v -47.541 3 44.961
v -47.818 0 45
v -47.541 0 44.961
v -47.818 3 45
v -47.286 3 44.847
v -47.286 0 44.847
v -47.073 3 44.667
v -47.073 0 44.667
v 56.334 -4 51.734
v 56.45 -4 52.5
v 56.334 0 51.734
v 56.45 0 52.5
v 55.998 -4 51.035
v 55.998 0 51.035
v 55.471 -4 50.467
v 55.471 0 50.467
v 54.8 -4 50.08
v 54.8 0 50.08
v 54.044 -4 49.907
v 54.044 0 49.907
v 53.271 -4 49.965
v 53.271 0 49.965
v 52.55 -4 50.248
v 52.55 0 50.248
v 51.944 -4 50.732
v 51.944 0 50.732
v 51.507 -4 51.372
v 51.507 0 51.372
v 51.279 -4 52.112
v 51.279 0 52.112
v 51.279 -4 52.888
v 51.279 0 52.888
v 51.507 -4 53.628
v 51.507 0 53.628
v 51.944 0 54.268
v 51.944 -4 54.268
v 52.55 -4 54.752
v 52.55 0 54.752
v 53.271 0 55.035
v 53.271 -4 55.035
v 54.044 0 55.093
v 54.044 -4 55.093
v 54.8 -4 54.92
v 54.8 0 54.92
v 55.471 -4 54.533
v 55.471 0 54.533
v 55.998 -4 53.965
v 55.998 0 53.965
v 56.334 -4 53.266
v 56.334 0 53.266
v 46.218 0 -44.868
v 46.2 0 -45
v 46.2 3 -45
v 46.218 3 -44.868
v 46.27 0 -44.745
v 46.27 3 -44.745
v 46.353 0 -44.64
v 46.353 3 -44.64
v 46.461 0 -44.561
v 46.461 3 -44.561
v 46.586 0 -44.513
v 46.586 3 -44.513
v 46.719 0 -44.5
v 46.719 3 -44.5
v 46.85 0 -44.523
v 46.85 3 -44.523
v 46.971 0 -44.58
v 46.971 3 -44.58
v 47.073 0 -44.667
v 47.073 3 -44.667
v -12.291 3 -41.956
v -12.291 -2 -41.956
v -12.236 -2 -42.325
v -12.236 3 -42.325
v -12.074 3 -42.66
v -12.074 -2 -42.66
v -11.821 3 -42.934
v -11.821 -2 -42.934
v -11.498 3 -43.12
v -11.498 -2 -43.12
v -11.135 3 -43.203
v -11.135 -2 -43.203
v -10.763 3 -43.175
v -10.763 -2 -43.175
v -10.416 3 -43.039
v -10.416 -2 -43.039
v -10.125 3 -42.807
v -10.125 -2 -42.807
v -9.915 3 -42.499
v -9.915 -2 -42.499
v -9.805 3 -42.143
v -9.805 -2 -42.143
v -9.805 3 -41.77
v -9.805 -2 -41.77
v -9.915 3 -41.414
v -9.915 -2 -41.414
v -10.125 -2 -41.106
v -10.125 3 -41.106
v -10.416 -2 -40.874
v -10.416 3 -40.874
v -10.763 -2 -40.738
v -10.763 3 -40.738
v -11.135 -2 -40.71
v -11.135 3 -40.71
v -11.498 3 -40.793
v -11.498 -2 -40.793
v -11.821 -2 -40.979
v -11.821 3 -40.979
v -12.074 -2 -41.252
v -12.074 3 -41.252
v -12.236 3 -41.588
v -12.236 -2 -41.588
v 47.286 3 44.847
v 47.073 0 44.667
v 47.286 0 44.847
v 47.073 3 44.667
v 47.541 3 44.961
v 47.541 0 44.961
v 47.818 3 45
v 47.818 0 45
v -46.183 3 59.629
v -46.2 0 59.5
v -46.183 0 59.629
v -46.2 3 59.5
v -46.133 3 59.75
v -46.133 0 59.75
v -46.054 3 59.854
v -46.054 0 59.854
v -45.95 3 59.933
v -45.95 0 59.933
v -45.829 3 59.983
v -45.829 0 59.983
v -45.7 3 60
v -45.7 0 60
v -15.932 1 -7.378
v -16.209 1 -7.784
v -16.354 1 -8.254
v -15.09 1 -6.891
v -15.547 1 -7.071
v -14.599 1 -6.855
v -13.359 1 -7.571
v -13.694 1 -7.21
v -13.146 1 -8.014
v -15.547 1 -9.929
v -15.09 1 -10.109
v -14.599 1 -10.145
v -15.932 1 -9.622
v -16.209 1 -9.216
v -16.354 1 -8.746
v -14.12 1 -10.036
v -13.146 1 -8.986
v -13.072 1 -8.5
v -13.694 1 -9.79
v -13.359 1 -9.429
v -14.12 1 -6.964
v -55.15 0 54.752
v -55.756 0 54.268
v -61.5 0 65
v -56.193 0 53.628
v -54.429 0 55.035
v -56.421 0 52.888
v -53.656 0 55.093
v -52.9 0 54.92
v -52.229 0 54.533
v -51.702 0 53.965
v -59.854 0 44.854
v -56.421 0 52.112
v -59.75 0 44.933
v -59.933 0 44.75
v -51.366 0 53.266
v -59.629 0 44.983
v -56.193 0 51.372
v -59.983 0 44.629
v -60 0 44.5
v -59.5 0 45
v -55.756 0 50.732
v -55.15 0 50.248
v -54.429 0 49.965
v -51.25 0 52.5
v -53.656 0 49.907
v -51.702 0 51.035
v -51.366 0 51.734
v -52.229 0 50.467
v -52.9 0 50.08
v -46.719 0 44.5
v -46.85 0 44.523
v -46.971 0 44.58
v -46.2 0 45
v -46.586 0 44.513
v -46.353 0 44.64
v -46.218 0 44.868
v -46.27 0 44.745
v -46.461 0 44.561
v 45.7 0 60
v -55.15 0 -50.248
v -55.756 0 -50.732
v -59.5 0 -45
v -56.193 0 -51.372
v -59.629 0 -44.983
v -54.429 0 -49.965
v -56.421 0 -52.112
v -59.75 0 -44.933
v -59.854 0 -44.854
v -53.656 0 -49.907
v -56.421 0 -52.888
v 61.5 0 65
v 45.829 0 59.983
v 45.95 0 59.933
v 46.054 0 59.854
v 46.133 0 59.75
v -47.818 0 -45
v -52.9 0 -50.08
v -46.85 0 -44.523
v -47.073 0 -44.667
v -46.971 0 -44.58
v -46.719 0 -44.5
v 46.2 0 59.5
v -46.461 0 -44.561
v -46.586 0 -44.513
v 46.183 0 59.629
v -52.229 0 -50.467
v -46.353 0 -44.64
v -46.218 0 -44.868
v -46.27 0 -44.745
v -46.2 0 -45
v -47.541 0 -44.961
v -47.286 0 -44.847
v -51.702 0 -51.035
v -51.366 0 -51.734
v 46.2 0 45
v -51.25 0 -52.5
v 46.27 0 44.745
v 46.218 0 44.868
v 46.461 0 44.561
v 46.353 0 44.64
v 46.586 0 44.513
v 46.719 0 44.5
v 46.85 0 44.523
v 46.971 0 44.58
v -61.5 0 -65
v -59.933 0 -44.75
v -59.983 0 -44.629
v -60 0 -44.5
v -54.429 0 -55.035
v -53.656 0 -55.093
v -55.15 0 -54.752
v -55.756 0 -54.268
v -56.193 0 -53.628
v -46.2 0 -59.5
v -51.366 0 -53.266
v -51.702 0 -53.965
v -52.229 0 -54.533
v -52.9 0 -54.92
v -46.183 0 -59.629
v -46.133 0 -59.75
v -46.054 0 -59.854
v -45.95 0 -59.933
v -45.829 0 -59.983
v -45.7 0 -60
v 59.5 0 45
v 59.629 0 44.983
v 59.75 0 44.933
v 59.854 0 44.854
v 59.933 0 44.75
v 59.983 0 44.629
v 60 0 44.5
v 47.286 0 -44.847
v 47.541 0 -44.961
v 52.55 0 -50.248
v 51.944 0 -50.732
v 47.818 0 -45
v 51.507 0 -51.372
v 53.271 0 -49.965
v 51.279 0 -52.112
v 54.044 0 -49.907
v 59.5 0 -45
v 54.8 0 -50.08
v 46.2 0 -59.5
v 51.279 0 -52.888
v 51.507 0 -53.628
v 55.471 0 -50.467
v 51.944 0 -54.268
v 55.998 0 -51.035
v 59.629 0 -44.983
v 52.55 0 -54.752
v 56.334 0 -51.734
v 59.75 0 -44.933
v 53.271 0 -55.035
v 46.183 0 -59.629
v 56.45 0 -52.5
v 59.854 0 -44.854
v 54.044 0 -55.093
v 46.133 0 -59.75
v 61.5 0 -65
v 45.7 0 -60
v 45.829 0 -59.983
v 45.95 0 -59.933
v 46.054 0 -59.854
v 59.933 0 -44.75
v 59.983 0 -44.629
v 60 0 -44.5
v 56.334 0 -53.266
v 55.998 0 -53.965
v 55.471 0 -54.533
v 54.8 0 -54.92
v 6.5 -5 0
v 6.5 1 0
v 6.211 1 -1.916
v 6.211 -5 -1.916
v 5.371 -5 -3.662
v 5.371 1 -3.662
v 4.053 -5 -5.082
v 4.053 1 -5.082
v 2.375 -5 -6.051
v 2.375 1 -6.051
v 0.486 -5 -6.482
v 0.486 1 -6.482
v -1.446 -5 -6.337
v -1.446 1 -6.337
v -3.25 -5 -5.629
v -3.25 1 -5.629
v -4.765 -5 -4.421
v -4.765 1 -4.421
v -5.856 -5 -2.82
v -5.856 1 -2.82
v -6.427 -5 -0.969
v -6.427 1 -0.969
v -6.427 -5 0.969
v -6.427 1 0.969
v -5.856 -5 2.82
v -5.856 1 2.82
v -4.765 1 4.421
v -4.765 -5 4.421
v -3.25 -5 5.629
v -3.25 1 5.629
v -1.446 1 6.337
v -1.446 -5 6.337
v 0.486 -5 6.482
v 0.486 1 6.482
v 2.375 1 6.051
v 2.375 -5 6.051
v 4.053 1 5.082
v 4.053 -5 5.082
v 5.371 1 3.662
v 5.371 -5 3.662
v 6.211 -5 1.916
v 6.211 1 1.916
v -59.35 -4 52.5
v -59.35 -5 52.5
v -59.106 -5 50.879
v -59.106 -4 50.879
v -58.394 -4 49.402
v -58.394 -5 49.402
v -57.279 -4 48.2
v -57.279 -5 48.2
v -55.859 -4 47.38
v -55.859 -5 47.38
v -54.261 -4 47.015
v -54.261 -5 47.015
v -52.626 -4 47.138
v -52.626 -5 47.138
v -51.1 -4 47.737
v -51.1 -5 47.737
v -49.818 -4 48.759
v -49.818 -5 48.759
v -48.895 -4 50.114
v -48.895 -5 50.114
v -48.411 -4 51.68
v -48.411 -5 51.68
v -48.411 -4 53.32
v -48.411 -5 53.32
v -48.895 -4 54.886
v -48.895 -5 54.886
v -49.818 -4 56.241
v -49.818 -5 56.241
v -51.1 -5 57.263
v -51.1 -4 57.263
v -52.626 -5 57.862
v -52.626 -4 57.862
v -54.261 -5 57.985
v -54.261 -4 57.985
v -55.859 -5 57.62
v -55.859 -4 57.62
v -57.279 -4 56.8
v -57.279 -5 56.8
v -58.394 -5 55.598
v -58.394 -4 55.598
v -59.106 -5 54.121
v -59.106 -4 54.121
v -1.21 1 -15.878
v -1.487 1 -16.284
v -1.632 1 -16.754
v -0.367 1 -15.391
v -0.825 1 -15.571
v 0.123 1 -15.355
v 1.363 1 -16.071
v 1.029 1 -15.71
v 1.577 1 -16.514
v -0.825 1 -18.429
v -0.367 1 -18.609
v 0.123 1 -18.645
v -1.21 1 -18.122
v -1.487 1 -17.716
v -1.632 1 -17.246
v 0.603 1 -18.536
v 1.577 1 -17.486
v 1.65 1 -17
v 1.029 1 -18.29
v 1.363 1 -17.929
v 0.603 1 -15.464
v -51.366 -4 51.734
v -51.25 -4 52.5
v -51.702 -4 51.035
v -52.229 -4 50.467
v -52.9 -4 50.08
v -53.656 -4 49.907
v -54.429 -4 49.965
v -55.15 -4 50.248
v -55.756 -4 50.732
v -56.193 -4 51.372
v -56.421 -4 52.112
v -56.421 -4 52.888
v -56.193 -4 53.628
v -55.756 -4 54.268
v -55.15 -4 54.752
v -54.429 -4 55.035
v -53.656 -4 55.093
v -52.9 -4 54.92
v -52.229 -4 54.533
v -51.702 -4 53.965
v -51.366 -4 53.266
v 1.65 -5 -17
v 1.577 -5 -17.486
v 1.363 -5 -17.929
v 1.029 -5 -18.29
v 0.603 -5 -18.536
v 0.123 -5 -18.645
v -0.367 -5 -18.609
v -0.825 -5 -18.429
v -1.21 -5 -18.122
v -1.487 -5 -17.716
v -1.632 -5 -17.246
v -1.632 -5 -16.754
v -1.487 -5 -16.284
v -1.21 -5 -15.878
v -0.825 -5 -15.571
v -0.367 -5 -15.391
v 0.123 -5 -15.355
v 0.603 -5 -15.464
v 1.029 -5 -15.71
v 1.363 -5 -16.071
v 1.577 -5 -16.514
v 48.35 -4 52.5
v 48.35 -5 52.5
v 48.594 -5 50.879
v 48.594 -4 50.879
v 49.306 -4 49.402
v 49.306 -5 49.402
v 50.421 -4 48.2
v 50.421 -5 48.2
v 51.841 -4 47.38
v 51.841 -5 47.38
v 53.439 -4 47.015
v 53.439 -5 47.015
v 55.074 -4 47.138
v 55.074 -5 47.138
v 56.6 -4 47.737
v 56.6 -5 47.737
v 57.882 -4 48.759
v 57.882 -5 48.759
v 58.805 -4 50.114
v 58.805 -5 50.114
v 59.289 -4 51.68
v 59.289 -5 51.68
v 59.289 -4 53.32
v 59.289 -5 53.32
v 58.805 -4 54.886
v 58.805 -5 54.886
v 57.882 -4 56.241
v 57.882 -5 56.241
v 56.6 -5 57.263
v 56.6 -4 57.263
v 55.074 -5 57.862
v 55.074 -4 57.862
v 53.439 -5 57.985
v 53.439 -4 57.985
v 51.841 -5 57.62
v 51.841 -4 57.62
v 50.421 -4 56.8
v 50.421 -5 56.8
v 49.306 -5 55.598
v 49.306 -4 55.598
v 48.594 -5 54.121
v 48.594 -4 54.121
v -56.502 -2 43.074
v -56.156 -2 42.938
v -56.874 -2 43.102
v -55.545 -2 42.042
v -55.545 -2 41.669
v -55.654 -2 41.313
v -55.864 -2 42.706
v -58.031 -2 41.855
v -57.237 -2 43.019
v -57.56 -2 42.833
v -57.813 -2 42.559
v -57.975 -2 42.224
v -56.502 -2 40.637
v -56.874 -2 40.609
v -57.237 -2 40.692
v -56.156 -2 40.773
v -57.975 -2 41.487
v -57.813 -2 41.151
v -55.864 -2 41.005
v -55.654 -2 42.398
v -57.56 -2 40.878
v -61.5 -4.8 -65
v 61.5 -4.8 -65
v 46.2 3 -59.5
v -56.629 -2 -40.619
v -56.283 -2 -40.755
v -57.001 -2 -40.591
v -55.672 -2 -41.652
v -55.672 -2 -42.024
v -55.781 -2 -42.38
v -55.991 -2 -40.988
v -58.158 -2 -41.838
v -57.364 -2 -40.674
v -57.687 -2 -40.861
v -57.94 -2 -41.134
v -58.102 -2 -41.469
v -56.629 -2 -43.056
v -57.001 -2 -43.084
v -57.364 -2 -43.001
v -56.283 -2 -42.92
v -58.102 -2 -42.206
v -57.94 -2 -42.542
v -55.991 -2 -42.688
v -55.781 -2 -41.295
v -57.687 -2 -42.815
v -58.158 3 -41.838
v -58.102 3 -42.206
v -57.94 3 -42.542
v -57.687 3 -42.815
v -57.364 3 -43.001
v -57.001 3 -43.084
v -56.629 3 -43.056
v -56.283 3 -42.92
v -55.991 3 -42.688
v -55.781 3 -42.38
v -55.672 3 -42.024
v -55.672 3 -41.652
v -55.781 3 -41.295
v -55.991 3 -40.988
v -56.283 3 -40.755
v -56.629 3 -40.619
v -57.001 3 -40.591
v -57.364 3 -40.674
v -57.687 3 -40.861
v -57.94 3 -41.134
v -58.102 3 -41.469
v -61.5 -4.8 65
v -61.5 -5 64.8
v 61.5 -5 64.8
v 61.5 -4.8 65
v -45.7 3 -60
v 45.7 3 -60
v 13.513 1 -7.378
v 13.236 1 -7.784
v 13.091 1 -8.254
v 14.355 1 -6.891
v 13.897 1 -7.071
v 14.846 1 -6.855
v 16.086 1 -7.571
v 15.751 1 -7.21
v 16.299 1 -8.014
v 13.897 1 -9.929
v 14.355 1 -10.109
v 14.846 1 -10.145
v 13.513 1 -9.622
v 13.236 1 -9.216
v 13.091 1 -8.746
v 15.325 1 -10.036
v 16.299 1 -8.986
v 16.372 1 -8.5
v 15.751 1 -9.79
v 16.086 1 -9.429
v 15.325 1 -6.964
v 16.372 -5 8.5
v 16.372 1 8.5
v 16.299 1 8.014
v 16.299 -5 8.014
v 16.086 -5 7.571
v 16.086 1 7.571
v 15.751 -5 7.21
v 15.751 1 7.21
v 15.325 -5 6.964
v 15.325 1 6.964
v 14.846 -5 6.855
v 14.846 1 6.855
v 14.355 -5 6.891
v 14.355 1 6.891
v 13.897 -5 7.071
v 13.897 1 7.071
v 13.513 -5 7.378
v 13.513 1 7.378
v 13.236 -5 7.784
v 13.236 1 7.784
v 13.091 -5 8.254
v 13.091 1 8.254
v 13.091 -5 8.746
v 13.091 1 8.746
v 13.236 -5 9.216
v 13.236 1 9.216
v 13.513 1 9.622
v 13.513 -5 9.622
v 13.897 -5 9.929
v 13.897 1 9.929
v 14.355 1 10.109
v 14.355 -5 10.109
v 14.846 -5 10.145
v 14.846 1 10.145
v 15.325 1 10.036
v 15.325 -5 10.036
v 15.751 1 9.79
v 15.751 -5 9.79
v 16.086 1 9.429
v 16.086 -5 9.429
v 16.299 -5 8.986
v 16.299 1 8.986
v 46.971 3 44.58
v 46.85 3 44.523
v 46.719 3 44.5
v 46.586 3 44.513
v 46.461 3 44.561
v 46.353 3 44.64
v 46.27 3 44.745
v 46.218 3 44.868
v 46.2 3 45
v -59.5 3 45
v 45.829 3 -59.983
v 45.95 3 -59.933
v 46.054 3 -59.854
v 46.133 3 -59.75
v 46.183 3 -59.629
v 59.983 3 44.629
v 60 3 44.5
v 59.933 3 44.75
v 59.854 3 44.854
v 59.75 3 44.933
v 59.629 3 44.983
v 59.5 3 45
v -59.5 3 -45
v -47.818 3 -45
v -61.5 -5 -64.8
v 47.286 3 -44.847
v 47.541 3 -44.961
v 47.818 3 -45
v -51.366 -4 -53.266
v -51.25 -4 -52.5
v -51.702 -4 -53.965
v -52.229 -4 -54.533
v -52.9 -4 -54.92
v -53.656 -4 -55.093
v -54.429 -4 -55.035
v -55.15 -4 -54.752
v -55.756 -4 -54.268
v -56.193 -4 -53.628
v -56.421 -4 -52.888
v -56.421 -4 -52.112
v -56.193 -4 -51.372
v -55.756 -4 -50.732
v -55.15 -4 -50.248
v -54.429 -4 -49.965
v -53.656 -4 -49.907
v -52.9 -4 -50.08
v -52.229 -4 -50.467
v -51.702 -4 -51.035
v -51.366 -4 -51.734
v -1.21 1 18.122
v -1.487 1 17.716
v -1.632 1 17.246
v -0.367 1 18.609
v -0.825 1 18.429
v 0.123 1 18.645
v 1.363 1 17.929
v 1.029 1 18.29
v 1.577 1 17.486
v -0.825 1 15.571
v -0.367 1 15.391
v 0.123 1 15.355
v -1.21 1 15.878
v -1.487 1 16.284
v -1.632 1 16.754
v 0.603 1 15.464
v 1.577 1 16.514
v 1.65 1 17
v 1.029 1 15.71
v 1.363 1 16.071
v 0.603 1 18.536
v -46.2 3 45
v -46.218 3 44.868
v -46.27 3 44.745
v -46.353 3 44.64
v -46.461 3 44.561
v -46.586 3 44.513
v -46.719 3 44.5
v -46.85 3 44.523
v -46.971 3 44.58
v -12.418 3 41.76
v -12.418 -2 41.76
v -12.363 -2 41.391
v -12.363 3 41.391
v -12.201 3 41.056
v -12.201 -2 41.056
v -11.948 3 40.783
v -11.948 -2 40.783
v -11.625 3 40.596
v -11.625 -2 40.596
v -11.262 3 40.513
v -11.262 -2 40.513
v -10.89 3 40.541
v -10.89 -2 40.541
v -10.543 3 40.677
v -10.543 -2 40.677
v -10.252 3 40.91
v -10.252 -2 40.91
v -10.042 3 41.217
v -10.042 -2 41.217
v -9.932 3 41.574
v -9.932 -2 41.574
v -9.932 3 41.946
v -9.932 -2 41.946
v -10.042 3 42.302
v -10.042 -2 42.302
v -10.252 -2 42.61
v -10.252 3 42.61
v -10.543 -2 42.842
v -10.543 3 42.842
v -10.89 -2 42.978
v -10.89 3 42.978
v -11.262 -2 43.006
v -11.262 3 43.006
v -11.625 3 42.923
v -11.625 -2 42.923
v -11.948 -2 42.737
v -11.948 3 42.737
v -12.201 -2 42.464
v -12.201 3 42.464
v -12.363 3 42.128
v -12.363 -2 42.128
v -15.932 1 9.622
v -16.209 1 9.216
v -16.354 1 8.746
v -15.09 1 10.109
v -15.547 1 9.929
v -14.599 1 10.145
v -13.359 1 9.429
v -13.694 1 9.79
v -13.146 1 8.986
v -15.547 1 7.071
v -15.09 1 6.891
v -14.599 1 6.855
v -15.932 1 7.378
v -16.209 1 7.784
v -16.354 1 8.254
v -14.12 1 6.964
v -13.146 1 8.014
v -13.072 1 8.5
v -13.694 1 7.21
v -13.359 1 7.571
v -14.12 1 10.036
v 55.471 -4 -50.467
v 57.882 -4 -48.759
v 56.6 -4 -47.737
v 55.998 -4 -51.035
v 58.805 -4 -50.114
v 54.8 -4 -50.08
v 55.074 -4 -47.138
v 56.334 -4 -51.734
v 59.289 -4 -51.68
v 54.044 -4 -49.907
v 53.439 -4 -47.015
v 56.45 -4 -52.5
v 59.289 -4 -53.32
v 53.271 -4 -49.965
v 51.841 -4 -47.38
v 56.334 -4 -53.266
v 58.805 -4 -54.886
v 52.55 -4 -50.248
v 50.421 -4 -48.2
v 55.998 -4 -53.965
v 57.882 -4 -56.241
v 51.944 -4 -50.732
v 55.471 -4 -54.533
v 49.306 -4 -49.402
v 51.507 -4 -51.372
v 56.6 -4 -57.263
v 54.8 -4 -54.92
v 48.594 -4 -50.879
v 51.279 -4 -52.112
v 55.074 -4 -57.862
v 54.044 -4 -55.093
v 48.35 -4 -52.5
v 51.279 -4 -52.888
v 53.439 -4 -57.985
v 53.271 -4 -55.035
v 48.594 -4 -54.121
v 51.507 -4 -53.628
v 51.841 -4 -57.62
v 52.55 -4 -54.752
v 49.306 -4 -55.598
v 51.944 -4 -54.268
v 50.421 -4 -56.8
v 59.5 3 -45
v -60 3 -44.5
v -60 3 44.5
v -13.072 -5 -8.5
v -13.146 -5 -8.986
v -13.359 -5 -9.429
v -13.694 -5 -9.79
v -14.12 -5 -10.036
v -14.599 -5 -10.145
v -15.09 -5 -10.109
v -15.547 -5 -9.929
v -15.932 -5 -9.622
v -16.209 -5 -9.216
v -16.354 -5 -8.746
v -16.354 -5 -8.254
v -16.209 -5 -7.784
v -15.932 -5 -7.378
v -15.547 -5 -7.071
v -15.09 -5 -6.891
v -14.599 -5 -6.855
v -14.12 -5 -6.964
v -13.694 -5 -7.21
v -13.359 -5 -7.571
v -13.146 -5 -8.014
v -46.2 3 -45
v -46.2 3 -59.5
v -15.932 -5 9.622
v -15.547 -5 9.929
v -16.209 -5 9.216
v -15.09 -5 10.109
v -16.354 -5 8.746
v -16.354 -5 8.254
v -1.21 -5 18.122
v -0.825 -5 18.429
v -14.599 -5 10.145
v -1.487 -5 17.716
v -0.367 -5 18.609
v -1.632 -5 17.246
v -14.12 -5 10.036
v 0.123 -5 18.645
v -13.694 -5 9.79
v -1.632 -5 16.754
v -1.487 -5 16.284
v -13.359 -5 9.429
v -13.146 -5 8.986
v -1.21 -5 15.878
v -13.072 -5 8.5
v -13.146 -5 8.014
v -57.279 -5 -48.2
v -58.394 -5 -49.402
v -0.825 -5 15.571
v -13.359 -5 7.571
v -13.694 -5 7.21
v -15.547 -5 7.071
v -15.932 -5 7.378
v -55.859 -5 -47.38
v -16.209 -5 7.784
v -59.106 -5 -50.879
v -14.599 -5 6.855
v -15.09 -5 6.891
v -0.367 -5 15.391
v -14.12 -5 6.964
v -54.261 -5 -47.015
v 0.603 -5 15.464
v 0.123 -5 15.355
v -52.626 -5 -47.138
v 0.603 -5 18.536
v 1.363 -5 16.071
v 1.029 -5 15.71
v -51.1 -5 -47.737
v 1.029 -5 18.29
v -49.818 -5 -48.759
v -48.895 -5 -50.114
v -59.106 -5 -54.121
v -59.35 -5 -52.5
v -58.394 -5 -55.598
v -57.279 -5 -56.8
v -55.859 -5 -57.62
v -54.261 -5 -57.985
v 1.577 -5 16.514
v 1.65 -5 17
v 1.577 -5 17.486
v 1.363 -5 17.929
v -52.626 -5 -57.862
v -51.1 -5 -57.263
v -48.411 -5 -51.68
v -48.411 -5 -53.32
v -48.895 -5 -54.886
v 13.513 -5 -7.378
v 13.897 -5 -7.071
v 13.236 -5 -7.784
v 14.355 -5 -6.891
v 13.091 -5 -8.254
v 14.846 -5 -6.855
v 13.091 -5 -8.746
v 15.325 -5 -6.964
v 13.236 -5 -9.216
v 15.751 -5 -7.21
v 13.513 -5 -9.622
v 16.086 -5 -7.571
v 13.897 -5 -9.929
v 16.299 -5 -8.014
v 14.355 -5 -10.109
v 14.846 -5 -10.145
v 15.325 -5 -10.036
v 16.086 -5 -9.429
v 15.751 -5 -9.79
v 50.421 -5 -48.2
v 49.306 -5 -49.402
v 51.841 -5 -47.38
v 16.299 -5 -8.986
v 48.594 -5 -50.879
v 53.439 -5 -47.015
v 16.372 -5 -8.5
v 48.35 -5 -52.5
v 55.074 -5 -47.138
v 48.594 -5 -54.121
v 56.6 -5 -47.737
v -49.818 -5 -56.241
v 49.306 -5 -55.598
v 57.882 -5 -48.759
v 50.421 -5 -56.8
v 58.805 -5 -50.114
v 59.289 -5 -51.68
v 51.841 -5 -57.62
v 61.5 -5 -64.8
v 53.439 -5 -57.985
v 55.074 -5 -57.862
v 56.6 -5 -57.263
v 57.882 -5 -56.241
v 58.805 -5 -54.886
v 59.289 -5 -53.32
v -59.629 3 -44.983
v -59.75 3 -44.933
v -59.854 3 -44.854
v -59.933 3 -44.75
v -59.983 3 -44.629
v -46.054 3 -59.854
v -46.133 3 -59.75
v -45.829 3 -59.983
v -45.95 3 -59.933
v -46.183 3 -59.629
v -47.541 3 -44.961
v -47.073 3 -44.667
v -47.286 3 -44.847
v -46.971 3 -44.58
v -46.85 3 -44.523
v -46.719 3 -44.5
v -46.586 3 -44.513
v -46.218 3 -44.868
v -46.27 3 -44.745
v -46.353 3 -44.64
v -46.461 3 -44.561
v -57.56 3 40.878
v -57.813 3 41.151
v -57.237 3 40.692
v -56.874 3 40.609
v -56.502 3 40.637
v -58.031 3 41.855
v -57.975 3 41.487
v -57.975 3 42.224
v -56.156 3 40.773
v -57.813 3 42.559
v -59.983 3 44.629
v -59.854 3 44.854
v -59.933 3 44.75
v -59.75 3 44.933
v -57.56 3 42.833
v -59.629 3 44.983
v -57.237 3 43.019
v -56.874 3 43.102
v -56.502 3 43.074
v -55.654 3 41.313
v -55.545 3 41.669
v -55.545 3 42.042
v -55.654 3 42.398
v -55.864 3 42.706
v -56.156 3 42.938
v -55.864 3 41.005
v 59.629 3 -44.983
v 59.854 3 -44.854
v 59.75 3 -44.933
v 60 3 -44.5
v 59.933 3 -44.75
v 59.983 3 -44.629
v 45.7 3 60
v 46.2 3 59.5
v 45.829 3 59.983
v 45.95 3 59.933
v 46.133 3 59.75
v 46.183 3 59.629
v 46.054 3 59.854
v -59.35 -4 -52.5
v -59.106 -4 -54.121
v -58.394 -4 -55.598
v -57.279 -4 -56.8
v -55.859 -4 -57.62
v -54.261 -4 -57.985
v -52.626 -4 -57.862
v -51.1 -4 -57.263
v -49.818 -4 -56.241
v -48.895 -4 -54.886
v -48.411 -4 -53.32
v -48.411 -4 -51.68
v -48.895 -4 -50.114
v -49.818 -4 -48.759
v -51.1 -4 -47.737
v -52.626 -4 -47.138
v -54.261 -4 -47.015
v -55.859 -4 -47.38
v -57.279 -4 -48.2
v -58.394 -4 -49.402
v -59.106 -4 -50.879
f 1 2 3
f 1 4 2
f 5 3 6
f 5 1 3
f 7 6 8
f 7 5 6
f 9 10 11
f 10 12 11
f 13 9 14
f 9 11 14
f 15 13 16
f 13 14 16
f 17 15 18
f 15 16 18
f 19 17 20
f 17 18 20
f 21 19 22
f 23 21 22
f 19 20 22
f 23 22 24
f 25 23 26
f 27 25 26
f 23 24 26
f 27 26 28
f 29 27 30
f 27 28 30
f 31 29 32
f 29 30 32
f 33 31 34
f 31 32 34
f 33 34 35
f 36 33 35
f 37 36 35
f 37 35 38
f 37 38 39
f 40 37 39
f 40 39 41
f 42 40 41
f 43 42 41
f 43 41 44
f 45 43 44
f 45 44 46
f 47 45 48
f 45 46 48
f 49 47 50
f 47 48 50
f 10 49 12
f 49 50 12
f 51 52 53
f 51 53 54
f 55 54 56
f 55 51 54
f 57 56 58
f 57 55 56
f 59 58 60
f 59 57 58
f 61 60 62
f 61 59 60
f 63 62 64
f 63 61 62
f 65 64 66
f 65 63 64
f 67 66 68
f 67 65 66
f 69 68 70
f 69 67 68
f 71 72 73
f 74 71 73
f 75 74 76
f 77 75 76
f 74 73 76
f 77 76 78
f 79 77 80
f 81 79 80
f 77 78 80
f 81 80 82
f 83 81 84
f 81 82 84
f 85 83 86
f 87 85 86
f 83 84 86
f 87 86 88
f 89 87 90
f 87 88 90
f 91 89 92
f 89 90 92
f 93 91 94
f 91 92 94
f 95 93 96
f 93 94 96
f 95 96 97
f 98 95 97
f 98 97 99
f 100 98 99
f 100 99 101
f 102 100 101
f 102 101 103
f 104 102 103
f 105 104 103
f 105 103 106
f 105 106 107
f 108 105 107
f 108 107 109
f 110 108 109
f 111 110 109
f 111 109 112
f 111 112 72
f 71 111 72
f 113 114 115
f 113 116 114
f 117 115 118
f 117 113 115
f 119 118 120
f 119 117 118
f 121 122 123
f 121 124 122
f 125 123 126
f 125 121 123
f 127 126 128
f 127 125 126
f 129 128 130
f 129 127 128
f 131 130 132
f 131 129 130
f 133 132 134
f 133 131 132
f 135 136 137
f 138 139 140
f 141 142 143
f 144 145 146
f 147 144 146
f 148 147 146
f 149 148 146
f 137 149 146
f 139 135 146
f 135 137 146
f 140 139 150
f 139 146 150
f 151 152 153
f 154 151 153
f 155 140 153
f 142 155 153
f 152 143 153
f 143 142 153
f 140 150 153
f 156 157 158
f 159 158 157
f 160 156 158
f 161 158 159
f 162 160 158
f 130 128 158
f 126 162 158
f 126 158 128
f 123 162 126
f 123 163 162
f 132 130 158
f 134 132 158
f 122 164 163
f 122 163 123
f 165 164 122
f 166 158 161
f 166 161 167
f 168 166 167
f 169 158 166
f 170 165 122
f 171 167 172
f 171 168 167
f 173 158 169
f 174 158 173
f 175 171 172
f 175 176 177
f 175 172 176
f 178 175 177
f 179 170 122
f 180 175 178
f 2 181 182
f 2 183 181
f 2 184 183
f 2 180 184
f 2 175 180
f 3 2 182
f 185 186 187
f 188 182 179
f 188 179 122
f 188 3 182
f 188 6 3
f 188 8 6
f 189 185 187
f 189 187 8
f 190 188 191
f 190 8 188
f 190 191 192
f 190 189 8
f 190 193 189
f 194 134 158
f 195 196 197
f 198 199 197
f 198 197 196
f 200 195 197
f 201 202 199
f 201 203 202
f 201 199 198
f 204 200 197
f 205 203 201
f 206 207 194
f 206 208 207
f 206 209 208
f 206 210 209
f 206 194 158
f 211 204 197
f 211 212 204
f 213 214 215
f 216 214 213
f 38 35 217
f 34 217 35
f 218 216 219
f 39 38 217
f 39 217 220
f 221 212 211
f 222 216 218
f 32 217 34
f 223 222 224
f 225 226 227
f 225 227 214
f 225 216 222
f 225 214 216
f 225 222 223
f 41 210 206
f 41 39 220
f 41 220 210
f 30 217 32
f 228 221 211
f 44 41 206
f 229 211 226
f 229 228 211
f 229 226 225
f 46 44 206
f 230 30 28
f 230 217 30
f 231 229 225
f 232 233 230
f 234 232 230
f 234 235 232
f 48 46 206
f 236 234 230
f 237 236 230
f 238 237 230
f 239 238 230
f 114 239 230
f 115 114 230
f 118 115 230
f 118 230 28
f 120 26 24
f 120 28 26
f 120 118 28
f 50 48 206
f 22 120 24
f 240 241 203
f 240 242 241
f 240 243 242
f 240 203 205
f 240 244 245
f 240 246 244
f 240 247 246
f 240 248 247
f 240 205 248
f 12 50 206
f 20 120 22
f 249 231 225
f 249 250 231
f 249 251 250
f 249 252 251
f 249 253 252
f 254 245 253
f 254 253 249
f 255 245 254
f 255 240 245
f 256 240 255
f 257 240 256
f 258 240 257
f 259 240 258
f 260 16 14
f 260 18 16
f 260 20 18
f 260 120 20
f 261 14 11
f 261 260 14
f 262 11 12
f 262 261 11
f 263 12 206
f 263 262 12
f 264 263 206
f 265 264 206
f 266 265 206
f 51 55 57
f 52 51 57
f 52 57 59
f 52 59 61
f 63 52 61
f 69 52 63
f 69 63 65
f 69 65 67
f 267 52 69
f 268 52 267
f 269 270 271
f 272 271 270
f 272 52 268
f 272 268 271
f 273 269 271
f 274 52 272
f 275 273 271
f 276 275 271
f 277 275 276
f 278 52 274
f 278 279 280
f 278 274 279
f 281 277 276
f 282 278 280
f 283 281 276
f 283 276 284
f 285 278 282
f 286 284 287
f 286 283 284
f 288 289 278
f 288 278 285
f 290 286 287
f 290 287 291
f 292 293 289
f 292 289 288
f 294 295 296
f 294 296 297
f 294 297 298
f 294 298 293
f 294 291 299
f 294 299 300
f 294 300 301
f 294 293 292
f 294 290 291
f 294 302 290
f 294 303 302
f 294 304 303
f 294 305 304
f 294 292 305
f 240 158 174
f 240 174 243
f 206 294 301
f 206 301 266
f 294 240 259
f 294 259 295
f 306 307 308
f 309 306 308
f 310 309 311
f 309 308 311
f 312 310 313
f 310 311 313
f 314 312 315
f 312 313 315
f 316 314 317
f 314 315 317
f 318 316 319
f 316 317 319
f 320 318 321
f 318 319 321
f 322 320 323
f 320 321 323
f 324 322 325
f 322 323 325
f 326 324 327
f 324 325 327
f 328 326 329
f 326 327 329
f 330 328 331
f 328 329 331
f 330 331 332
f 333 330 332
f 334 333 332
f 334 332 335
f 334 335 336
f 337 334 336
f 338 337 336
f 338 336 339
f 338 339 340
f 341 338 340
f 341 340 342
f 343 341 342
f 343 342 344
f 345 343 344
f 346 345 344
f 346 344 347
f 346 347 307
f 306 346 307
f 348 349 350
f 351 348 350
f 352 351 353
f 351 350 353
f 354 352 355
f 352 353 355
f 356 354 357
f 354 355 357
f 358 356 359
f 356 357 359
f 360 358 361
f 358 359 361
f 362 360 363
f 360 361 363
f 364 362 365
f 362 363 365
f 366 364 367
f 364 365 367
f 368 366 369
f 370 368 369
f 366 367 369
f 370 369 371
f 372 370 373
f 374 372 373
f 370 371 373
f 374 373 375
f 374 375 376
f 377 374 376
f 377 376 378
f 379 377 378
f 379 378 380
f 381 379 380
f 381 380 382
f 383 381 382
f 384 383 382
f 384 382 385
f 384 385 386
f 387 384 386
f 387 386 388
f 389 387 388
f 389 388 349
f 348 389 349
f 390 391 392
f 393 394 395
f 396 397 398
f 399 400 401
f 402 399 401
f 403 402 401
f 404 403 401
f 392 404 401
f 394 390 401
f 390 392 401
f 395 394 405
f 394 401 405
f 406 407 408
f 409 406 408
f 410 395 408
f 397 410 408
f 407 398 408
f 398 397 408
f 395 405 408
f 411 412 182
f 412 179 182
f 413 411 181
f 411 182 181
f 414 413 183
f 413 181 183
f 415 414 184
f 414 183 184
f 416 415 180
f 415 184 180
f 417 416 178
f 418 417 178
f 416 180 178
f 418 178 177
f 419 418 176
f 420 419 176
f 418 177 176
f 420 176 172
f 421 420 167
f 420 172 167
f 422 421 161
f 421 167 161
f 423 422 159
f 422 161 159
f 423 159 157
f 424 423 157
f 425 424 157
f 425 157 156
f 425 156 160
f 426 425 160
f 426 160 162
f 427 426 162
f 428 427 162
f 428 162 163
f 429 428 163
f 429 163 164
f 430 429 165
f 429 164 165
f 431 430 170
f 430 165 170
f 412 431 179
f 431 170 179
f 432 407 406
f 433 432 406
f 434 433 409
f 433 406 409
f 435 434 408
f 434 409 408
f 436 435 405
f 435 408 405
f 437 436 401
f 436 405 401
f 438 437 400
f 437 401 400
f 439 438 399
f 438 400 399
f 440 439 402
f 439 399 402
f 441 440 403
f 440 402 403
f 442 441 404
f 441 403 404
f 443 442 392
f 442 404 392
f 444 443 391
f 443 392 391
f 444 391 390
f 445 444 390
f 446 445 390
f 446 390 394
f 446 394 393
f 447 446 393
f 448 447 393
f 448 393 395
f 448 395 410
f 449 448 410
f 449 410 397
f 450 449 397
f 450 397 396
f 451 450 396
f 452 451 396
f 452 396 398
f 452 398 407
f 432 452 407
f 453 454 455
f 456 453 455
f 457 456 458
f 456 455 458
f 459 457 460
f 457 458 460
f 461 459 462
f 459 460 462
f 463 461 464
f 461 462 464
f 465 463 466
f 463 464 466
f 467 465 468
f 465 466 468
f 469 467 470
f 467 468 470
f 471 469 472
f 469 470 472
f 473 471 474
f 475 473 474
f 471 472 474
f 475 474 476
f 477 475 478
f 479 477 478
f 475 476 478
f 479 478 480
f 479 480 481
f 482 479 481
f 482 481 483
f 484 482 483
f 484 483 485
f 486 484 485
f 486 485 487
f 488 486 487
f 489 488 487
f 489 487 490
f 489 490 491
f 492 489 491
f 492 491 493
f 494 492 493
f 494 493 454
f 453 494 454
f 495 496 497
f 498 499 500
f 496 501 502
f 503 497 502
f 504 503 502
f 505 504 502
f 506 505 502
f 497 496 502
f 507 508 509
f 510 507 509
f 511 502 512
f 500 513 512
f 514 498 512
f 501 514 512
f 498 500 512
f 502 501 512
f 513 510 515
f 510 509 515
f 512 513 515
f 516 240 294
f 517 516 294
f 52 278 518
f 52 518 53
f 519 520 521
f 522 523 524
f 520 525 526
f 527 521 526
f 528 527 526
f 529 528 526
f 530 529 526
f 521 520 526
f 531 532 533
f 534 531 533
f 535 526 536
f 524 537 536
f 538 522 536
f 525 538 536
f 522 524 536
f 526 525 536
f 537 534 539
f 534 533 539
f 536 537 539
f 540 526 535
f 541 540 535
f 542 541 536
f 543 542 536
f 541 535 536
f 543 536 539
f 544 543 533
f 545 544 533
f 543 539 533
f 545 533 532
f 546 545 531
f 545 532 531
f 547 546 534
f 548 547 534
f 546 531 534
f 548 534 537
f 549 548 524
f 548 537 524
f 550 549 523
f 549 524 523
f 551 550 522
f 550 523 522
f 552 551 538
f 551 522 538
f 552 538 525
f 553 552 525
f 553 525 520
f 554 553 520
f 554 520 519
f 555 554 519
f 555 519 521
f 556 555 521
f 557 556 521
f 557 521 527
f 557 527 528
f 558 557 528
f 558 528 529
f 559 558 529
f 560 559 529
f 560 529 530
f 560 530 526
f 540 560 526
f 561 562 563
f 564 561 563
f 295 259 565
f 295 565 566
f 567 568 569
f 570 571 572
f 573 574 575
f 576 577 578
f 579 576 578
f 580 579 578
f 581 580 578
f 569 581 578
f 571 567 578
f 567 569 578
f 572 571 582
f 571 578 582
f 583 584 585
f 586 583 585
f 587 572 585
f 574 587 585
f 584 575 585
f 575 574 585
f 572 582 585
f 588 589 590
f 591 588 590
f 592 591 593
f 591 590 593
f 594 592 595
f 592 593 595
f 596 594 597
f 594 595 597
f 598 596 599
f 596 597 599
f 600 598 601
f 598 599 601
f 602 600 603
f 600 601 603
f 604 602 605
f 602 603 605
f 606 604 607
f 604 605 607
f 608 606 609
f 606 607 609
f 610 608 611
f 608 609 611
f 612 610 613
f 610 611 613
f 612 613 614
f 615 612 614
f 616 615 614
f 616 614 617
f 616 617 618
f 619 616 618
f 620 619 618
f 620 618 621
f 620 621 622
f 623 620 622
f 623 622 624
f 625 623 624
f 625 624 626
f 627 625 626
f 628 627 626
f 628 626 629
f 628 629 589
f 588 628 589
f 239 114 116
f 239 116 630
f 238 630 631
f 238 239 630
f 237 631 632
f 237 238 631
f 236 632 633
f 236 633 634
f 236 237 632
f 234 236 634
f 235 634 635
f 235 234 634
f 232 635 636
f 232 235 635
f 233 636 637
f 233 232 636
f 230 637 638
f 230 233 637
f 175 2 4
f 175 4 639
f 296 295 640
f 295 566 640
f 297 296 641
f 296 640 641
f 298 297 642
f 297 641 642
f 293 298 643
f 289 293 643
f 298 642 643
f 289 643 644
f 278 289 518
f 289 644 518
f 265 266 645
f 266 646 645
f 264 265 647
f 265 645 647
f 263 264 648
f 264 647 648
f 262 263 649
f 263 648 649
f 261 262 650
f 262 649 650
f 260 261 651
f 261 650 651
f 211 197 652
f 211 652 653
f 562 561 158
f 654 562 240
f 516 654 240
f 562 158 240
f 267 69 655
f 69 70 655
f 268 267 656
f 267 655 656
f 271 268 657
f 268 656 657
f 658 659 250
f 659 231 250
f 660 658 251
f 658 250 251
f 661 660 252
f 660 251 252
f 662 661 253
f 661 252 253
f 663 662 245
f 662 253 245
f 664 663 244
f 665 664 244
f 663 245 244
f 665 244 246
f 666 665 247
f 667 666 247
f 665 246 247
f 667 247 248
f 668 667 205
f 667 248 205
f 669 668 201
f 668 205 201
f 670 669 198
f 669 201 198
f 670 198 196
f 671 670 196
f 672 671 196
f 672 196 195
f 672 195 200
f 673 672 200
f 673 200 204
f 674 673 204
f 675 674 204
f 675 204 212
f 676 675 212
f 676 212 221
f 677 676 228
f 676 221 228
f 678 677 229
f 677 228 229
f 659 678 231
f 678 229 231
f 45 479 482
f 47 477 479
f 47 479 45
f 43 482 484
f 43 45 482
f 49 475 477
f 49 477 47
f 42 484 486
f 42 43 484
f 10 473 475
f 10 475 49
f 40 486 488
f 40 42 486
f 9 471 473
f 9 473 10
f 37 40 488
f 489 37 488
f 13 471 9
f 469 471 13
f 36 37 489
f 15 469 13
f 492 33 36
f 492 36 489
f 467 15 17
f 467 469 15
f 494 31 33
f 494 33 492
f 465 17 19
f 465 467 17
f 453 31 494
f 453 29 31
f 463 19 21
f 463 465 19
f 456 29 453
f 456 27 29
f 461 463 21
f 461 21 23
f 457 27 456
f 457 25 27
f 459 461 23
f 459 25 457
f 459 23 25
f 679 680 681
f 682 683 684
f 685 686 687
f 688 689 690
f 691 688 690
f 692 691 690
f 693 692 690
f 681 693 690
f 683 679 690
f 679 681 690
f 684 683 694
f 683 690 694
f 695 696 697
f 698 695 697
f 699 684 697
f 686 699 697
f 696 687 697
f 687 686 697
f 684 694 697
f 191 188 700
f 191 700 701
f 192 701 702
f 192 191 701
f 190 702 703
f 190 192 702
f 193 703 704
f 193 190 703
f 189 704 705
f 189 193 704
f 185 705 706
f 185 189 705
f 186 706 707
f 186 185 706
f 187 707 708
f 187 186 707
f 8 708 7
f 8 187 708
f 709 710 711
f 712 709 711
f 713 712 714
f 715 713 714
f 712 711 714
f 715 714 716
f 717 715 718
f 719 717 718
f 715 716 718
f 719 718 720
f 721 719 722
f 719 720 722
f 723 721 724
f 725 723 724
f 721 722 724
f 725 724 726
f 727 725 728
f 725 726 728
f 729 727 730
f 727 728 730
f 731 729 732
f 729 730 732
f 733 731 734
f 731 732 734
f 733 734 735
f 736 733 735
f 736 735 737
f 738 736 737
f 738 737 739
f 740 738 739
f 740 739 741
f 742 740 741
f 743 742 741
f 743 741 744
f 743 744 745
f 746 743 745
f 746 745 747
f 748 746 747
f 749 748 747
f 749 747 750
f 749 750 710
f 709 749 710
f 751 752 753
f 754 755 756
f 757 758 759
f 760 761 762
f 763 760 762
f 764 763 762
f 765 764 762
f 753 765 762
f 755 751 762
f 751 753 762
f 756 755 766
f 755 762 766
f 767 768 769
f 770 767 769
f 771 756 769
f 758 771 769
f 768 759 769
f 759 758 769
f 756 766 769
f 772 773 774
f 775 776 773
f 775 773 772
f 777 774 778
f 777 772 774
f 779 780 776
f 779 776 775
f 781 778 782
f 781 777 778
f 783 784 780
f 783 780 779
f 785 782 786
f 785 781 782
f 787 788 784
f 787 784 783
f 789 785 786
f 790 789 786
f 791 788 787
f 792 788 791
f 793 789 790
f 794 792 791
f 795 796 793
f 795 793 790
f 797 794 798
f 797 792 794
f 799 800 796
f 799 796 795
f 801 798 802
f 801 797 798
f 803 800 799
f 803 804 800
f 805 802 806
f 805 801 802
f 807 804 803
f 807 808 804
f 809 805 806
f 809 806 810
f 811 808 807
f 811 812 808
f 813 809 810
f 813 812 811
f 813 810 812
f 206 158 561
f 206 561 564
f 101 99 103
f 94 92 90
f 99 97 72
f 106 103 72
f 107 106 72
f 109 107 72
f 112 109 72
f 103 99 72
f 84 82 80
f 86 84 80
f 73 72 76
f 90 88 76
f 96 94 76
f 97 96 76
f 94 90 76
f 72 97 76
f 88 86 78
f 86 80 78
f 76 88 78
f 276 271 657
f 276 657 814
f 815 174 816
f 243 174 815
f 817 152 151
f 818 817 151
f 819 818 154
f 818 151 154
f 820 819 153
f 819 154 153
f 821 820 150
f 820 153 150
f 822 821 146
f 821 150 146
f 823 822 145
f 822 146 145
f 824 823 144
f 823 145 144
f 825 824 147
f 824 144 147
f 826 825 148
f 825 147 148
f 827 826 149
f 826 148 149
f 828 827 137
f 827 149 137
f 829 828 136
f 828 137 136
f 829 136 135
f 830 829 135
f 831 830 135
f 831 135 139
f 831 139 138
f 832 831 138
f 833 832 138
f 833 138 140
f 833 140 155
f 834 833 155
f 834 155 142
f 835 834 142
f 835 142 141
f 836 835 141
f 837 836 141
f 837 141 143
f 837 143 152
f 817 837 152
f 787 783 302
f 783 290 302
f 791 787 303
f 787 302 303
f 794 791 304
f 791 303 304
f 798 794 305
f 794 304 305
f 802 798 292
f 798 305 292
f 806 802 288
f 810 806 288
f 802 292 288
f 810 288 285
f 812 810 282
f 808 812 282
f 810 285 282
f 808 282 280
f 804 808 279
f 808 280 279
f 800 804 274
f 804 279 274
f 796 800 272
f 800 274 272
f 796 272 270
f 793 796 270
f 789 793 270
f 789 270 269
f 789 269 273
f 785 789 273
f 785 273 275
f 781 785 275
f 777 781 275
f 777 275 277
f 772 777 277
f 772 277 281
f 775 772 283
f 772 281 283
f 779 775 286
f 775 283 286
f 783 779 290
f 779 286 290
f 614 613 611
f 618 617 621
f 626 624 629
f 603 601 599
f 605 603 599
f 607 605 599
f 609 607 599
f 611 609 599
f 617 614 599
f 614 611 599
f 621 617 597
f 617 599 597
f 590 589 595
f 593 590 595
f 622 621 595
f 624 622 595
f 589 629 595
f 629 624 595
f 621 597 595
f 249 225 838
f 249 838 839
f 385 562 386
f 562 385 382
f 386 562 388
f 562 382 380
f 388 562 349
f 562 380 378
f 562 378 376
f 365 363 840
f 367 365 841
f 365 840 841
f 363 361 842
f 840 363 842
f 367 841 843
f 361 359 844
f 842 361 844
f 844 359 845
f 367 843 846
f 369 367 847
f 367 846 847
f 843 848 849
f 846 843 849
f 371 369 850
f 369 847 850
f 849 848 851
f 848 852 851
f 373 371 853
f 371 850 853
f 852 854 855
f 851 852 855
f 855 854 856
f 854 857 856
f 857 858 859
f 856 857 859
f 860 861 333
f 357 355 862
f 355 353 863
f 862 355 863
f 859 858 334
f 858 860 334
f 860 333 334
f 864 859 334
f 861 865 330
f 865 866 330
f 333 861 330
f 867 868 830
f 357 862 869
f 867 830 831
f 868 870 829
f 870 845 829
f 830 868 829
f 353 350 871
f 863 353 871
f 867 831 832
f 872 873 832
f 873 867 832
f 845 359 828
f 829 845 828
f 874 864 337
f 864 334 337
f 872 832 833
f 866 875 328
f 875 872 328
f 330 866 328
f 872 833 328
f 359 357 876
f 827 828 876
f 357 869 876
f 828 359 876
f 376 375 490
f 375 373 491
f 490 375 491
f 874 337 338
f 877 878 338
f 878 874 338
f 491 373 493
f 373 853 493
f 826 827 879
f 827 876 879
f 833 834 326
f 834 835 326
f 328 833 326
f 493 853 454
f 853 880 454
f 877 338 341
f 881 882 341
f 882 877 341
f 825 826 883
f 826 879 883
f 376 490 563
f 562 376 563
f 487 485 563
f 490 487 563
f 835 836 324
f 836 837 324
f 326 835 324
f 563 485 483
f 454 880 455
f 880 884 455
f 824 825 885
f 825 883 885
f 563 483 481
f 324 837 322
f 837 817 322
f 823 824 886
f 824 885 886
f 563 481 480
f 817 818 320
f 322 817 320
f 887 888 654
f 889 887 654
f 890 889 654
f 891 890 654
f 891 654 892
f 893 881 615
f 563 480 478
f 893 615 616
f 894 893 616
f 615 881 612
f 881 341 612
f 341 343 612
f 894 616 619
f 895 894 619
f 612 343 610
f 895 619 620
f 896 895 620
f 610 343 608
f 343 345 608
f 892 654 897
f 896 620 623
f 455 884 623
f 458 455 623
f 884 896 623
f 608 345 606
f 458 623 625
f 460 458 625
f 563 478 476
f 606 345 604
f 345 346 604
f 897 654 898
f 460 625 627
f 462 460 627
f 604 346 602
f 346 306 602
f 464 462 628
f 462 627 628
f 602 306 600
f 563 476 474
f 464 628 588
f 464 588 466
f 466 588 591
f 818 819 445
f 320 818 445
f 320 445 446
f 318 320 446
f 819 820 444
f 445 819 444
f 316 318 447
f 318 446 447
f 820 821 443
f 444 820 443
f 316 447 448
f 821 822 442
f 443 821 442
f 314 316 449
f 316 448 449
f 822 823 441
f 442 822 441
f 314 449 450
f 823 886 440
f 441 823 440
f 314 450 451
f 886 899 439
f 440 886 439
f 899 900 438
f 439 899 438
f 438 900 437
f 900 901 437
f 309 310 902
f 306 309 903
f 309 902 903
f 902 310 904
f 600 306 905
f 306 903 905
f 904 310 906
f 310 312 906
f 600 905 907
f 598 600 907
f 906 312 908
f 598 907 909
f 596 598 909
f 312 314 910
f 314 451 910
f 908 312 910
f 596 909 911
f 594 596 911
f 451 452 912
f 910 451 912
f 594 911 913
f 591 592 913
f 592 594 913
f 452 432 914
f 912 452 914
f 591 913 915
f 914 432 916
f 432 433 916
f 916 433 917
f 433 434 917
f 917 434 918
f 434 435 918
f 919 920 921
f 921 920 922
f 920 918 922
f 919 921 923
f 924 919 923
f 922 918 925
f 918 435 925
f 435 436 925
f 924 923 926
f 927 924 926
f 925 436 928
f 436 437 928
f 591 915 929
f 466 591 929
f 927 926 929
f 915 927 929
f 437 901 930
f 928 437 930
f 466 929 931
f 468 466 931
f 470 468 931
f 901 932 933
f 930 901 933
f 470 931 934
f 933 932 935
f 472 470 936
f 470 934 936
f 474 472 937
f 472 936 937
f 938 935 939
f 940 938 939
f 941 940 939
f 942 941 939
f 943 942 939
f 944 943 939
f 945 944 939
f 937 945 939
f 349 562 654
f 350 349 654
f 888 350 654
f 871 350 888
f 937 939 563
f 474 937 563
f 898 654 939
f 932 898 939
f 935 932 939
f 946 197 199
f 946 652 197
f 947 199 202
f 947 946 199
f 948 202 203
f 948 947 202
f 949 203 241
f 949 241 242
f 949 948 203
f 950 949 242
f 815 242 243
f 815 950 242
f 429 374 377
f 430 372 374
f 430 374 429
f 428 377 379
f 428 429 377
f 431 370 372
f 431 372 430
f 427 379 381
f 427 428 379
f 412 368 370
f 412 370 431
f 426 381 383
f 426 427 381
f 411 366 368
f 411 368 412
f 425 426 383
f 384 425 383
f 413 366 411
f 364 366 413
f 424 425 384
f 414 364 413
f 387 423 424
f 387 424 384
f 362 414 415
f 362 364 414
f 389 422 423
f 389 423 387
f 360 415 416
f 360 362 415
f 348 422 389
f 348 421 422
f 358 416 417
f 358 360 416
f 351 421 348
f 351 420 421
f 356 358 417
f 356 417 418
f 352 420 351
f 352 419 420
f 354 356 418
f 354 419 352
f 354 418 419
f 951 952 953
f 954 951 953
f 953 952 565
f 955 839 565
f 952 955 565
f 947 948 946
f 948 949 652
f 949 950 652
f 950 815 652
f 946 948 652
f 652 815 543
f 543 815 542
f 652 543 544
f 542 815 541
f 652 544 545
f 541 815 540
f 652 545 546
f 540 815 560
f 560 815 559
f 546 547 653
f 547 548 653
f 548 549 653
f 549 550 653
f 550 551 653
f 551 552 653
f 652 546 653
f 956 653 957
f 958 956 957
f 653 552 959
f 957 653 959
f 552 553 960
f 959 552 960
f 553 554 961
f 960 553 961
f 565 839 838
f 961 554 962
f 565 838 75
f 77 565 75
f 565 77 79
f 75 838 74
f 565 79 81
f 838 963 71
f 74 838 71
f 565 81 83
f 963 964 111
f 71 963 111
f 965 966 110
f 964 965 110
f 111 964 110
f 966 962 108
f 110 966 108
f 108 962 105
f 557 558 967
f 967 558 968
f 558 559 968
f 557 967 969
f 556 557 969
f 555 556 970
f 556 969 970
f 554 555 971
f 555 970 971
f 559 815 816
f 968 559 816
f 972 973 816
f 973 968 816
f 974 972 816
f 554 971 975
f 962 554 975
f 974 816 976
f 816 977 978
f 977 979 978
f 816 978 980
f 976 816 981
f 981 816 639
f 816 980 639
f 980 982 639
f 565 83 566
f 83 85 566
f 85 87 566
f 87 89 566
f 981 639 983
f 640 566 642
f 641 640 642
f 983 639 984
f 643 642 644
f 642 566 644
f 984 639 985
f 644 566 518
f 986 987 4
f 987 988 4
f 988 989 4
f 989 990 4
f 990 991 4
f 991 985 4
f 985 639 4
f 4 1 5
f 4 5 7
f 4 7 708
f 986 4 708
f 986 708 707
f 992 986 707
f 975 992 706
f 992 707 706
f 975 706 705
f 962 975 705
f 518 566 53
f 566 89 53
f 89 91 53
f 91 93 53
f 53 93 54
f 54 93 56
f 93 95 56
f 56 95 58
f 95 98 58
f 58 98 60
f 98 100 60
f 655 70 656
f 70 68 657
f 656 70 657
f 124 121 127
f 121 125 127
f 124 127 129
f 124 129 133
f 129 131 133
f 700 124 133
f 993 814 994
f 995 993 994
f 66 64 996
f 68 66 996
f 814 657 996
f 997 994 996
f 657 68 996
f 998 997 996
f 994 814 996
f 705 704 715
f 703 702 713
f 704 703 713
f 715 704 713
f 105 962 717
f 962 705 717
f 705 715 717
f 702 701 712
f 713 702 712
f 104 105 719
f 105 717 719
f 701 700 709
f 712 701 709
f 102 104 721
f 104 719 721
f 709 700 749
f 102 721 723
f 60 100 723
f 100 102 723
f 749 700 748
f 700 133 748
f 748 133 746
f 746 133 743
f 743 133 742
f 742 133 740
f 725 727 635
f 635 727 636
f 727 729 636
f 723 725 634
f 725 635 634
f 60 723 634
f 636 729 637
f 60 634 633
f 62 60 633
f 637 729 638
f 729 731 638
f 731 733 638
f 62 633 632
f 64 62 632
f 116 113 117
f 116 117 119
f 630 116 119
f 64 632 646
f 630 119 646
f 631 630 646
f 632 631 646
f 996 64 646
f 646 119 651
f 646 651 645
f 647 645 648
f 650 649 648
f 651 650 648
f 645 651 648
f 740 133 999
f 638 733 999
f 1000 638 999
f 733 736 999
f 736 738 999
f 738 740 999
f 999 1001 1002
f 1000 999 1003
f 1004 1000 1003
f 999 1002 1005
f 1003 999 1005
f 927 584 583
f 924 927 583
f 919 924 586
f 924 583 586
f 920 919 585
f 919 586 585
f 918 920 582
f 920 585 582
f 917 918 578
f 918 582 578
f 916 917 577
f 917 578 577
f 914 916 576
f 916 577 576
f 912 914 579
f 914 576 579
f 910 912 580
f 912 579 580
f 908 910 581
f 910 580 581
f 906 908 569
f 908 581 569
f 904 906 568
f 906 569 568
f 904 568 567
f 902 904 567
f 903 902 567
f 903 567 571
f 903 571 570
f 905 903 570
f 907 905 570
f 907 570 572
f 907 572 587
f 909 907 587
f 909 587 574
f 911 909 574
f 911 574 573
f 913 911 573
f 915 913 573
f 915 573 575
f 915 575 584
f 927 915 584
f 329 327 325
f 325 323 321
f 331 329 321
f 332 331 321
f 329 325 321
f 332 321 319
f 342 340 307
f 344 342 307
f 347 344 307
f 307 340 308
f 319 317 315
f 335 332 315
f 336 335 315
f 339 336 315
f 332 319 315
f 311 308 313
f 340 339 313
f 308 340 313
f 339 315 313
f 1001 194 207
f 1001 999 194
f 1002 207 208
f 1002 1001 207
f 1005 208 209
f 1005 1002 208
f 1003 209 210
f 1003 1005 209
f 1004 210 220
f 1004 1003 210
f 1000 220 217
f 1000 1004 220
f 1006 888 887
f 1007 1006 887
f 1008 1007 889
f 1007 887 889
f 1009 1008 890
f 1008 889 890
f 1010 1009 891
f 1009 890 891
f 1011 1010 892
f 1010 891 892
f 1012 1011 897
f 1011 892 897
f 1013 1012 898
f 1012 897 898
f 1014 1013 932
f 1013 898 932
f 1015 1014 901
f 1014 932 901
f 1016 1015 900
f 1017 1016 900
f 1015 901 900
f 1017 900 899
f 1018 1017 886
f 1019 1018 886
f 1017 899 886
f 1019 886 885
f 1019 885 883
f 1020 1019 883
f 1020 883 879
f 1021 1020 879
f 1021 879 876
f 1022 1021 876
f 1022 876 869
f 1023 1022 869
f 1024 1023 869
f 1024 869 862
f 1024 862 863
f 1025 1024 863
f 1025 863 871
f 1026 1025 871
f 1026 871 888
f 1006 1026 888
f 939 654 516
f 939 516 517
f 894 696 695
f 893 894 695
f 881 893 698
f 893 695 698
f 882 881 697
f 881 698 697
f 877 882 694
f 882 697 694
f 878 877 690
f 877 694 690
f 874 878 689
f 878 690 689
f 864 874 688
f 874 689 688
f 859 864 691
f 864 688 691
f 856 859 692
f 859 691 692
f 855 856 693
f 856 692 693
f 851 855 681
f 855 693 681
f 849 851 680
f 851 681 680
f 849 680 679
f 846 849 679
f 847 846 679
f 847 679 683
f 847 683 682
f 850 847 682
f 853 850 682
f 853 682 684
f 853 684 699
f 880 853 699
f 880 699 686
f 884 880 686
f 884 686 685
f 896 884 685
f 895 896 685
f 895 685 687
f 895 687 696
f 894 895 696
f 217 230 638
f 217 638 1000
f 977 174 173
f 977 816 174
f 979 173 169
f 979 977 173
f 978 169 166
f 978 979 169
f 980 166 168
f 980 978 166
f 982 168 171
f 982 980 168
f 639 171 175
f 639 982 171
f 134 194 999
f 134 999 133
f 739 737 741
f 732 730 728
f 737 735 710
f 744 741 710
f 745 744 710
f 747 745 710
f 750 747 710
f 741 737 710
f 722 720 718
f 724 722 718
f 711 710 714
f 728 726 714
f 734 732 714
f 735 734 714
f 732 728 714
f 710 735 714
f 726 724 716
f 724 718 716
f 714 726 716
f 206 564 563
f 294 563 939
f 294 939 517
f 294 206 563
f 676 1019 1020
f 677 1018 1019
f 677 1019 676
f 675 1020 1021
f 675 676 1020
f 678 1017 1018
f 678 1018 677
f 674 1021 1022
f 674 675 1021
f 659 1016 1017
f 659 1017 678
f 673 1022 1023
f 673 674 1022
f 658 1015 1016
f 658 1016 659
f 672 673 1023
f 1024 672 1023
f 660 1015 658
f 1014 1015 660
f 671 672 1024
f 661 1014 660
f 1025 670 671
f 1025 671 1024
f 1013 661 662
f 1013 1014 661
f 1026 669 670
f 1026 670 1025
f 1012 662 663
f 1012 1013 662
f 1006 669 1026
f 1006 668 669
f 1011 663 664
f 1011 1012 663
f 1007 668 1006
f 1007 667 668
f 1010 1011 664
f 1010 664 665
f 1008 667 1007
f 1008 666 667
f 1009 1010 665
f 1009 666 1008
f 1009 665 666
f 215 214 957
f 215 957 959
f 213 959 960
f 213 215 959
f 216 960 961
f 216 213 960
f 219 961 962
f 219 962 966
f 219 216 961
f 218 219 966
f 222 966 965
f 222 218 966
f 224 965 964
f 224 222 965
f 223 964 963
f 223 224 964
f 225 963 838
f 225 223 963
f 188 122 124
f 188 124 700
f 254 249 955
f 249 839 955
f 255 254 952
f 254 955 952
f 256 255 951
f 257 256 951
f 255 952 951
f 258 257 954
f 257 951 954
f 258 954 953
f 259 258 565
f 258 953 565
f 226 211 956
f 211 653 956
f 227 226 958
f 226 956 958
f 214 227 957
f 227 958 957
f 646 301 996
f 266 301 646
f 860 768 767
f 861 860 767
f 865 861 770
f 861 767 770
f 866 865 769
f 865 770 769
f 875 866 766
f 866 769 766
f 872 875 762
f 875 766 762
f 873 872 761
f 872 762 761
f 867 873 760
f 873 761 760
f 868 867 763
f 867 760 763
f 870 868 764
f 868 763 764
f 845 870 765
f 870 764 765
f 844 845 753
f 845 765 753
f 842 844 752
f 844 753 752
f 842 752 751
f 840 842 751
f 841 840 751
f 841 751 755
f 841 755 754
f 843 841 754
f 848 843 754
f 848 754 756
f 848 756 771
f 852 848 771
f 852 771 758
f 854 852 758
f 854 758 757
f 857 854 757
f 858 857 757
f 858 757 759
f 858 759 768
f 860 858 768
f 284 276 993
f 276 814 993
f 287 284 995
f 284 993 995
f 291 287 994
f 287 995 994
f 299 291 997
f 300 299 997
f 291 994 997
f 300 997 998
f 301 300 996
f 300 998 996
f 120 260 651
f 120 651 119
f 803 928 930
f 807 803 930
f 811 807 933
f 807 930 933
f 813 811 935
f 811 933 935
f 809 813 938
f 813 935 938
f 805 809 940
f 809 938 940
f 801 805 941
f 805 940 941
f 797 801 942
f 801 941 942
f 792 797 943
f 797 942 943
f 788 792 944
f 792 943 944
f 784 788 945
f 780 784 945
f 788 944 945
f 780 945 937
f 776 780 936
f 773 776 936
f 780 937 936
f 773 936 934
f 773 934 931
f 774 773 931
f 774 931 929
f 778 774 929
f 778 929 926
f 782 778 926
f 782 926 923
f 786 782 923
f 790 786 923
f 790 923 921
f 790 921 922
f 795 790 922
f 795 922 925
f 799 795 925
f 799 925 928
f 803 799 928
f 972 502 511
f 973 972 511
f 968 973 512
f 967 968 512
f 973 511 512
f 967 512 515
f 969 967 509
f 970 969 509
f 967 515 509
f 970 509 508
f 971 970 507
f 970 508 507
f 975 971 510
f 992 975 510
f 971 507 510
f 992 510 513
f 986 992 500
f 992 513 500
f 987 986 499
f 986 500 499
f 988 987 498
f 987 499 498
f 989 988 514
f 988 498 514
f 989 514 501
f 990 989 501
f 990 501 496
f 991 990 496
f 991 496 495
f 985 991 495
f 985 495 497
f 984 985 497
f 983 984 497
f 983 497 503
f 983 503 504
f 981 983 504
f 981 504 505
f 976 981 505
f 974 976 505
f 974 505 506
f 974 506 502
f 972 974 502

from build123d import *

# Parameters (mm, degrees)
SKETCH_1_W                  = 123
SKETCH_1_H                  = 130
EXTRUDE_1_DEPTH             = 5
EXTRUDE_2_DEPTH             = 3
HOLE_WIZARD_13_0_13_1_D     = 13
HOLE_WIZARD_13_0_13_1_DEPTH = 6
HOLE_WIZARD_2_5_2_5_1_D     = 2.5
HOLE_WIZARD_2_5_2_5_1_DEPTH = 5
HOLE_WIZARD_3_3_3_3_1_D     = 3.3
HOLE_WIZARD_3_3_3_3_1_DEPTH = 6
HOLE_WIZARD_1_D             = 5.2
HOLE_WIZARD_1_DEPTH         = 8
HOLE_WIZARD_1_CBORE_D       = 11
HOLE_WIZARD_1_CBORE_DEPTH   = 1
CHAMFER_1_SIZE              = 0.2
FILLET_1_R                  = 0.5
FILLET_2_R                  = 1


with BuildPart() as part:
    # 草图1 → 凸台-拉伸1 (new body)
    with BuildSketch(Plane(origin=(0, 0, 0), x_dir=(1, 0, 0), z_dir=(0, 1, 0))):
        Rectangle(SKETCH_1_W, SKETCH_1_H)
    extrude(amount=-EXTRUDE_1_DEPTH)

    # 草图2 → 凸台-拉伸2 (add)
    with BuildSketch(Plane(origin=(0, 0, 0), x_dir=(-1, 0, 0), z_dir=(0, 1, 0))):
        with BuildLine():
            Line((46.2, -45), (46.2, -60))
            Line((46.2, -60), (-46.2, -60))
            Line((-46.2, -60), (-46.2, -45))
            ThreePointArc((-46.2, -45), (-46.7, -44.5), (-47.2, -45))
            Line((-47.2, -45), (-60, -45))
            Line((-60, -45), (-60, 45))
            Line((-60, 45), (-47.2, 45))
            ThreePointArc((-47.2, 45), (-46.7, 44.5), (-46.2, 45))
            Line((-46.2, 45), (-46.2, 60))
            Line((-46.2, 60), (46.2, 60))
            Line((46.2, 60), (46.2, 45))
            ThreePointArc((46.2, 45), (46.7, 44.5), (47.2, 45))
            Line((47.2, 45), (60, 45))
            Line((60, 45), (60, -45))
            Line((60, -45), (47.2, -45))
            ThreePointArc((47.2, -45), (46.7, -44.5), (46.2, -45))
        make_face()
    extrude(amount=EXTRUDE_2_DEPTH)

    # Ø13.0 (13) 直径孔1
    with Locations(Plane(origin=(0, -5, 0), x_dir=(-1, 0, 0), z_dir=(0, -1, 0))):
        with Locations((0, 0)):
            Hole(HOLE_WIZARD_13_0_13_1_D / 2, depth=HOLE_WIZARD_13_0_13_1_DEPTH)

    # Ø2.5 (2.5) 直径孔1
    with Locations(Plane(origin=(0, 3, 0), x_dir=(1, 0, 0), z_dir=(0, 1, 0))):
        with Locations((-56.780566421, -41.855346711), (-11.041427483, 41.956342393), (-56.907566675, 41.837820676), (-11.168427737, -41.75982474)):
            Hole(HOLE_WIZARD_2_5_2_5_1_D / 2, depth=HOLE_WIZARD_2_5_2_5_1_DEPTH)

    # Ø3.3 (3.3) 直径孔1
    with Locations(Plane(origin=(0, -5, 0), x_dir=(-1, 0, 0), z_dir=(0, -1, 0))):
        with Locations((-14.722431864, -8.5), (-14.722431864, 8.5), (0, 17), (14.722431864, 8.5), (14.722431864, -8.5), (0, -17)):
            Hole(HOLE_WIZARD_3_3_3_3_1_D / 2, depth=HOLE_WIZARD_3_3_3_3_1_DEPTH)

    # 孔1
    with Locations(Plane(origin=(0, -5, 0), x_dir=(-1, 0, 0), z_dir=(0, -1, 0))):
        with Locations((53.85, 52.5), (-53.85, -52.5), (53.85, -52.5), (-53.85, 52.5)):
            CounterBoreHole(HOLE_WIZARD_1_D / 2, HOLE_WIZARD_1_CBORE_D / 2, HOLE_WIZARD_1_CBORE_DEPTH, depth=HOLE_WIZARD_1_DEPTH)

    # 倒角1
    chamfer_1_edges = [part.edges().sort_by_distance(p)[0] for p in [
        (0, -5, 65),
        (0, -5, -65),
    ]]
    chamfer(chamfer_1_edges, length=CHAMFER_1_SIZE)

    # 圆角1
    fillet_1_edges = [part.edges().sort_by_distance(p)[0] for p in [
        (-60, 1.5, -45),
        (-60, 1.5, 45),
        (-46.2, 1.5, 60),
        (46.2, 1.5, 60),
        (60, 1.5, 45),
        (60, 1.5, -45),
        (46.2, 1.5, -60),
        (-46.2, 1.5, -60),
    ]]
    fillet(fillet_1_edges, radius=FILLET_1_R)

    # 圆角2
    fillet_2_edges = [part.edges().sort_by_distance(p)[0] for p in [
        (-47.2, 1.5, -45),
        (-47.2, 1.5, 45),
        (47.2, 1.5, 45),
        (47.2, 1.5, -45),
    ]]
    fillet(fillet_2_edges, radius=FILLET_2_R)


solid = part.part
